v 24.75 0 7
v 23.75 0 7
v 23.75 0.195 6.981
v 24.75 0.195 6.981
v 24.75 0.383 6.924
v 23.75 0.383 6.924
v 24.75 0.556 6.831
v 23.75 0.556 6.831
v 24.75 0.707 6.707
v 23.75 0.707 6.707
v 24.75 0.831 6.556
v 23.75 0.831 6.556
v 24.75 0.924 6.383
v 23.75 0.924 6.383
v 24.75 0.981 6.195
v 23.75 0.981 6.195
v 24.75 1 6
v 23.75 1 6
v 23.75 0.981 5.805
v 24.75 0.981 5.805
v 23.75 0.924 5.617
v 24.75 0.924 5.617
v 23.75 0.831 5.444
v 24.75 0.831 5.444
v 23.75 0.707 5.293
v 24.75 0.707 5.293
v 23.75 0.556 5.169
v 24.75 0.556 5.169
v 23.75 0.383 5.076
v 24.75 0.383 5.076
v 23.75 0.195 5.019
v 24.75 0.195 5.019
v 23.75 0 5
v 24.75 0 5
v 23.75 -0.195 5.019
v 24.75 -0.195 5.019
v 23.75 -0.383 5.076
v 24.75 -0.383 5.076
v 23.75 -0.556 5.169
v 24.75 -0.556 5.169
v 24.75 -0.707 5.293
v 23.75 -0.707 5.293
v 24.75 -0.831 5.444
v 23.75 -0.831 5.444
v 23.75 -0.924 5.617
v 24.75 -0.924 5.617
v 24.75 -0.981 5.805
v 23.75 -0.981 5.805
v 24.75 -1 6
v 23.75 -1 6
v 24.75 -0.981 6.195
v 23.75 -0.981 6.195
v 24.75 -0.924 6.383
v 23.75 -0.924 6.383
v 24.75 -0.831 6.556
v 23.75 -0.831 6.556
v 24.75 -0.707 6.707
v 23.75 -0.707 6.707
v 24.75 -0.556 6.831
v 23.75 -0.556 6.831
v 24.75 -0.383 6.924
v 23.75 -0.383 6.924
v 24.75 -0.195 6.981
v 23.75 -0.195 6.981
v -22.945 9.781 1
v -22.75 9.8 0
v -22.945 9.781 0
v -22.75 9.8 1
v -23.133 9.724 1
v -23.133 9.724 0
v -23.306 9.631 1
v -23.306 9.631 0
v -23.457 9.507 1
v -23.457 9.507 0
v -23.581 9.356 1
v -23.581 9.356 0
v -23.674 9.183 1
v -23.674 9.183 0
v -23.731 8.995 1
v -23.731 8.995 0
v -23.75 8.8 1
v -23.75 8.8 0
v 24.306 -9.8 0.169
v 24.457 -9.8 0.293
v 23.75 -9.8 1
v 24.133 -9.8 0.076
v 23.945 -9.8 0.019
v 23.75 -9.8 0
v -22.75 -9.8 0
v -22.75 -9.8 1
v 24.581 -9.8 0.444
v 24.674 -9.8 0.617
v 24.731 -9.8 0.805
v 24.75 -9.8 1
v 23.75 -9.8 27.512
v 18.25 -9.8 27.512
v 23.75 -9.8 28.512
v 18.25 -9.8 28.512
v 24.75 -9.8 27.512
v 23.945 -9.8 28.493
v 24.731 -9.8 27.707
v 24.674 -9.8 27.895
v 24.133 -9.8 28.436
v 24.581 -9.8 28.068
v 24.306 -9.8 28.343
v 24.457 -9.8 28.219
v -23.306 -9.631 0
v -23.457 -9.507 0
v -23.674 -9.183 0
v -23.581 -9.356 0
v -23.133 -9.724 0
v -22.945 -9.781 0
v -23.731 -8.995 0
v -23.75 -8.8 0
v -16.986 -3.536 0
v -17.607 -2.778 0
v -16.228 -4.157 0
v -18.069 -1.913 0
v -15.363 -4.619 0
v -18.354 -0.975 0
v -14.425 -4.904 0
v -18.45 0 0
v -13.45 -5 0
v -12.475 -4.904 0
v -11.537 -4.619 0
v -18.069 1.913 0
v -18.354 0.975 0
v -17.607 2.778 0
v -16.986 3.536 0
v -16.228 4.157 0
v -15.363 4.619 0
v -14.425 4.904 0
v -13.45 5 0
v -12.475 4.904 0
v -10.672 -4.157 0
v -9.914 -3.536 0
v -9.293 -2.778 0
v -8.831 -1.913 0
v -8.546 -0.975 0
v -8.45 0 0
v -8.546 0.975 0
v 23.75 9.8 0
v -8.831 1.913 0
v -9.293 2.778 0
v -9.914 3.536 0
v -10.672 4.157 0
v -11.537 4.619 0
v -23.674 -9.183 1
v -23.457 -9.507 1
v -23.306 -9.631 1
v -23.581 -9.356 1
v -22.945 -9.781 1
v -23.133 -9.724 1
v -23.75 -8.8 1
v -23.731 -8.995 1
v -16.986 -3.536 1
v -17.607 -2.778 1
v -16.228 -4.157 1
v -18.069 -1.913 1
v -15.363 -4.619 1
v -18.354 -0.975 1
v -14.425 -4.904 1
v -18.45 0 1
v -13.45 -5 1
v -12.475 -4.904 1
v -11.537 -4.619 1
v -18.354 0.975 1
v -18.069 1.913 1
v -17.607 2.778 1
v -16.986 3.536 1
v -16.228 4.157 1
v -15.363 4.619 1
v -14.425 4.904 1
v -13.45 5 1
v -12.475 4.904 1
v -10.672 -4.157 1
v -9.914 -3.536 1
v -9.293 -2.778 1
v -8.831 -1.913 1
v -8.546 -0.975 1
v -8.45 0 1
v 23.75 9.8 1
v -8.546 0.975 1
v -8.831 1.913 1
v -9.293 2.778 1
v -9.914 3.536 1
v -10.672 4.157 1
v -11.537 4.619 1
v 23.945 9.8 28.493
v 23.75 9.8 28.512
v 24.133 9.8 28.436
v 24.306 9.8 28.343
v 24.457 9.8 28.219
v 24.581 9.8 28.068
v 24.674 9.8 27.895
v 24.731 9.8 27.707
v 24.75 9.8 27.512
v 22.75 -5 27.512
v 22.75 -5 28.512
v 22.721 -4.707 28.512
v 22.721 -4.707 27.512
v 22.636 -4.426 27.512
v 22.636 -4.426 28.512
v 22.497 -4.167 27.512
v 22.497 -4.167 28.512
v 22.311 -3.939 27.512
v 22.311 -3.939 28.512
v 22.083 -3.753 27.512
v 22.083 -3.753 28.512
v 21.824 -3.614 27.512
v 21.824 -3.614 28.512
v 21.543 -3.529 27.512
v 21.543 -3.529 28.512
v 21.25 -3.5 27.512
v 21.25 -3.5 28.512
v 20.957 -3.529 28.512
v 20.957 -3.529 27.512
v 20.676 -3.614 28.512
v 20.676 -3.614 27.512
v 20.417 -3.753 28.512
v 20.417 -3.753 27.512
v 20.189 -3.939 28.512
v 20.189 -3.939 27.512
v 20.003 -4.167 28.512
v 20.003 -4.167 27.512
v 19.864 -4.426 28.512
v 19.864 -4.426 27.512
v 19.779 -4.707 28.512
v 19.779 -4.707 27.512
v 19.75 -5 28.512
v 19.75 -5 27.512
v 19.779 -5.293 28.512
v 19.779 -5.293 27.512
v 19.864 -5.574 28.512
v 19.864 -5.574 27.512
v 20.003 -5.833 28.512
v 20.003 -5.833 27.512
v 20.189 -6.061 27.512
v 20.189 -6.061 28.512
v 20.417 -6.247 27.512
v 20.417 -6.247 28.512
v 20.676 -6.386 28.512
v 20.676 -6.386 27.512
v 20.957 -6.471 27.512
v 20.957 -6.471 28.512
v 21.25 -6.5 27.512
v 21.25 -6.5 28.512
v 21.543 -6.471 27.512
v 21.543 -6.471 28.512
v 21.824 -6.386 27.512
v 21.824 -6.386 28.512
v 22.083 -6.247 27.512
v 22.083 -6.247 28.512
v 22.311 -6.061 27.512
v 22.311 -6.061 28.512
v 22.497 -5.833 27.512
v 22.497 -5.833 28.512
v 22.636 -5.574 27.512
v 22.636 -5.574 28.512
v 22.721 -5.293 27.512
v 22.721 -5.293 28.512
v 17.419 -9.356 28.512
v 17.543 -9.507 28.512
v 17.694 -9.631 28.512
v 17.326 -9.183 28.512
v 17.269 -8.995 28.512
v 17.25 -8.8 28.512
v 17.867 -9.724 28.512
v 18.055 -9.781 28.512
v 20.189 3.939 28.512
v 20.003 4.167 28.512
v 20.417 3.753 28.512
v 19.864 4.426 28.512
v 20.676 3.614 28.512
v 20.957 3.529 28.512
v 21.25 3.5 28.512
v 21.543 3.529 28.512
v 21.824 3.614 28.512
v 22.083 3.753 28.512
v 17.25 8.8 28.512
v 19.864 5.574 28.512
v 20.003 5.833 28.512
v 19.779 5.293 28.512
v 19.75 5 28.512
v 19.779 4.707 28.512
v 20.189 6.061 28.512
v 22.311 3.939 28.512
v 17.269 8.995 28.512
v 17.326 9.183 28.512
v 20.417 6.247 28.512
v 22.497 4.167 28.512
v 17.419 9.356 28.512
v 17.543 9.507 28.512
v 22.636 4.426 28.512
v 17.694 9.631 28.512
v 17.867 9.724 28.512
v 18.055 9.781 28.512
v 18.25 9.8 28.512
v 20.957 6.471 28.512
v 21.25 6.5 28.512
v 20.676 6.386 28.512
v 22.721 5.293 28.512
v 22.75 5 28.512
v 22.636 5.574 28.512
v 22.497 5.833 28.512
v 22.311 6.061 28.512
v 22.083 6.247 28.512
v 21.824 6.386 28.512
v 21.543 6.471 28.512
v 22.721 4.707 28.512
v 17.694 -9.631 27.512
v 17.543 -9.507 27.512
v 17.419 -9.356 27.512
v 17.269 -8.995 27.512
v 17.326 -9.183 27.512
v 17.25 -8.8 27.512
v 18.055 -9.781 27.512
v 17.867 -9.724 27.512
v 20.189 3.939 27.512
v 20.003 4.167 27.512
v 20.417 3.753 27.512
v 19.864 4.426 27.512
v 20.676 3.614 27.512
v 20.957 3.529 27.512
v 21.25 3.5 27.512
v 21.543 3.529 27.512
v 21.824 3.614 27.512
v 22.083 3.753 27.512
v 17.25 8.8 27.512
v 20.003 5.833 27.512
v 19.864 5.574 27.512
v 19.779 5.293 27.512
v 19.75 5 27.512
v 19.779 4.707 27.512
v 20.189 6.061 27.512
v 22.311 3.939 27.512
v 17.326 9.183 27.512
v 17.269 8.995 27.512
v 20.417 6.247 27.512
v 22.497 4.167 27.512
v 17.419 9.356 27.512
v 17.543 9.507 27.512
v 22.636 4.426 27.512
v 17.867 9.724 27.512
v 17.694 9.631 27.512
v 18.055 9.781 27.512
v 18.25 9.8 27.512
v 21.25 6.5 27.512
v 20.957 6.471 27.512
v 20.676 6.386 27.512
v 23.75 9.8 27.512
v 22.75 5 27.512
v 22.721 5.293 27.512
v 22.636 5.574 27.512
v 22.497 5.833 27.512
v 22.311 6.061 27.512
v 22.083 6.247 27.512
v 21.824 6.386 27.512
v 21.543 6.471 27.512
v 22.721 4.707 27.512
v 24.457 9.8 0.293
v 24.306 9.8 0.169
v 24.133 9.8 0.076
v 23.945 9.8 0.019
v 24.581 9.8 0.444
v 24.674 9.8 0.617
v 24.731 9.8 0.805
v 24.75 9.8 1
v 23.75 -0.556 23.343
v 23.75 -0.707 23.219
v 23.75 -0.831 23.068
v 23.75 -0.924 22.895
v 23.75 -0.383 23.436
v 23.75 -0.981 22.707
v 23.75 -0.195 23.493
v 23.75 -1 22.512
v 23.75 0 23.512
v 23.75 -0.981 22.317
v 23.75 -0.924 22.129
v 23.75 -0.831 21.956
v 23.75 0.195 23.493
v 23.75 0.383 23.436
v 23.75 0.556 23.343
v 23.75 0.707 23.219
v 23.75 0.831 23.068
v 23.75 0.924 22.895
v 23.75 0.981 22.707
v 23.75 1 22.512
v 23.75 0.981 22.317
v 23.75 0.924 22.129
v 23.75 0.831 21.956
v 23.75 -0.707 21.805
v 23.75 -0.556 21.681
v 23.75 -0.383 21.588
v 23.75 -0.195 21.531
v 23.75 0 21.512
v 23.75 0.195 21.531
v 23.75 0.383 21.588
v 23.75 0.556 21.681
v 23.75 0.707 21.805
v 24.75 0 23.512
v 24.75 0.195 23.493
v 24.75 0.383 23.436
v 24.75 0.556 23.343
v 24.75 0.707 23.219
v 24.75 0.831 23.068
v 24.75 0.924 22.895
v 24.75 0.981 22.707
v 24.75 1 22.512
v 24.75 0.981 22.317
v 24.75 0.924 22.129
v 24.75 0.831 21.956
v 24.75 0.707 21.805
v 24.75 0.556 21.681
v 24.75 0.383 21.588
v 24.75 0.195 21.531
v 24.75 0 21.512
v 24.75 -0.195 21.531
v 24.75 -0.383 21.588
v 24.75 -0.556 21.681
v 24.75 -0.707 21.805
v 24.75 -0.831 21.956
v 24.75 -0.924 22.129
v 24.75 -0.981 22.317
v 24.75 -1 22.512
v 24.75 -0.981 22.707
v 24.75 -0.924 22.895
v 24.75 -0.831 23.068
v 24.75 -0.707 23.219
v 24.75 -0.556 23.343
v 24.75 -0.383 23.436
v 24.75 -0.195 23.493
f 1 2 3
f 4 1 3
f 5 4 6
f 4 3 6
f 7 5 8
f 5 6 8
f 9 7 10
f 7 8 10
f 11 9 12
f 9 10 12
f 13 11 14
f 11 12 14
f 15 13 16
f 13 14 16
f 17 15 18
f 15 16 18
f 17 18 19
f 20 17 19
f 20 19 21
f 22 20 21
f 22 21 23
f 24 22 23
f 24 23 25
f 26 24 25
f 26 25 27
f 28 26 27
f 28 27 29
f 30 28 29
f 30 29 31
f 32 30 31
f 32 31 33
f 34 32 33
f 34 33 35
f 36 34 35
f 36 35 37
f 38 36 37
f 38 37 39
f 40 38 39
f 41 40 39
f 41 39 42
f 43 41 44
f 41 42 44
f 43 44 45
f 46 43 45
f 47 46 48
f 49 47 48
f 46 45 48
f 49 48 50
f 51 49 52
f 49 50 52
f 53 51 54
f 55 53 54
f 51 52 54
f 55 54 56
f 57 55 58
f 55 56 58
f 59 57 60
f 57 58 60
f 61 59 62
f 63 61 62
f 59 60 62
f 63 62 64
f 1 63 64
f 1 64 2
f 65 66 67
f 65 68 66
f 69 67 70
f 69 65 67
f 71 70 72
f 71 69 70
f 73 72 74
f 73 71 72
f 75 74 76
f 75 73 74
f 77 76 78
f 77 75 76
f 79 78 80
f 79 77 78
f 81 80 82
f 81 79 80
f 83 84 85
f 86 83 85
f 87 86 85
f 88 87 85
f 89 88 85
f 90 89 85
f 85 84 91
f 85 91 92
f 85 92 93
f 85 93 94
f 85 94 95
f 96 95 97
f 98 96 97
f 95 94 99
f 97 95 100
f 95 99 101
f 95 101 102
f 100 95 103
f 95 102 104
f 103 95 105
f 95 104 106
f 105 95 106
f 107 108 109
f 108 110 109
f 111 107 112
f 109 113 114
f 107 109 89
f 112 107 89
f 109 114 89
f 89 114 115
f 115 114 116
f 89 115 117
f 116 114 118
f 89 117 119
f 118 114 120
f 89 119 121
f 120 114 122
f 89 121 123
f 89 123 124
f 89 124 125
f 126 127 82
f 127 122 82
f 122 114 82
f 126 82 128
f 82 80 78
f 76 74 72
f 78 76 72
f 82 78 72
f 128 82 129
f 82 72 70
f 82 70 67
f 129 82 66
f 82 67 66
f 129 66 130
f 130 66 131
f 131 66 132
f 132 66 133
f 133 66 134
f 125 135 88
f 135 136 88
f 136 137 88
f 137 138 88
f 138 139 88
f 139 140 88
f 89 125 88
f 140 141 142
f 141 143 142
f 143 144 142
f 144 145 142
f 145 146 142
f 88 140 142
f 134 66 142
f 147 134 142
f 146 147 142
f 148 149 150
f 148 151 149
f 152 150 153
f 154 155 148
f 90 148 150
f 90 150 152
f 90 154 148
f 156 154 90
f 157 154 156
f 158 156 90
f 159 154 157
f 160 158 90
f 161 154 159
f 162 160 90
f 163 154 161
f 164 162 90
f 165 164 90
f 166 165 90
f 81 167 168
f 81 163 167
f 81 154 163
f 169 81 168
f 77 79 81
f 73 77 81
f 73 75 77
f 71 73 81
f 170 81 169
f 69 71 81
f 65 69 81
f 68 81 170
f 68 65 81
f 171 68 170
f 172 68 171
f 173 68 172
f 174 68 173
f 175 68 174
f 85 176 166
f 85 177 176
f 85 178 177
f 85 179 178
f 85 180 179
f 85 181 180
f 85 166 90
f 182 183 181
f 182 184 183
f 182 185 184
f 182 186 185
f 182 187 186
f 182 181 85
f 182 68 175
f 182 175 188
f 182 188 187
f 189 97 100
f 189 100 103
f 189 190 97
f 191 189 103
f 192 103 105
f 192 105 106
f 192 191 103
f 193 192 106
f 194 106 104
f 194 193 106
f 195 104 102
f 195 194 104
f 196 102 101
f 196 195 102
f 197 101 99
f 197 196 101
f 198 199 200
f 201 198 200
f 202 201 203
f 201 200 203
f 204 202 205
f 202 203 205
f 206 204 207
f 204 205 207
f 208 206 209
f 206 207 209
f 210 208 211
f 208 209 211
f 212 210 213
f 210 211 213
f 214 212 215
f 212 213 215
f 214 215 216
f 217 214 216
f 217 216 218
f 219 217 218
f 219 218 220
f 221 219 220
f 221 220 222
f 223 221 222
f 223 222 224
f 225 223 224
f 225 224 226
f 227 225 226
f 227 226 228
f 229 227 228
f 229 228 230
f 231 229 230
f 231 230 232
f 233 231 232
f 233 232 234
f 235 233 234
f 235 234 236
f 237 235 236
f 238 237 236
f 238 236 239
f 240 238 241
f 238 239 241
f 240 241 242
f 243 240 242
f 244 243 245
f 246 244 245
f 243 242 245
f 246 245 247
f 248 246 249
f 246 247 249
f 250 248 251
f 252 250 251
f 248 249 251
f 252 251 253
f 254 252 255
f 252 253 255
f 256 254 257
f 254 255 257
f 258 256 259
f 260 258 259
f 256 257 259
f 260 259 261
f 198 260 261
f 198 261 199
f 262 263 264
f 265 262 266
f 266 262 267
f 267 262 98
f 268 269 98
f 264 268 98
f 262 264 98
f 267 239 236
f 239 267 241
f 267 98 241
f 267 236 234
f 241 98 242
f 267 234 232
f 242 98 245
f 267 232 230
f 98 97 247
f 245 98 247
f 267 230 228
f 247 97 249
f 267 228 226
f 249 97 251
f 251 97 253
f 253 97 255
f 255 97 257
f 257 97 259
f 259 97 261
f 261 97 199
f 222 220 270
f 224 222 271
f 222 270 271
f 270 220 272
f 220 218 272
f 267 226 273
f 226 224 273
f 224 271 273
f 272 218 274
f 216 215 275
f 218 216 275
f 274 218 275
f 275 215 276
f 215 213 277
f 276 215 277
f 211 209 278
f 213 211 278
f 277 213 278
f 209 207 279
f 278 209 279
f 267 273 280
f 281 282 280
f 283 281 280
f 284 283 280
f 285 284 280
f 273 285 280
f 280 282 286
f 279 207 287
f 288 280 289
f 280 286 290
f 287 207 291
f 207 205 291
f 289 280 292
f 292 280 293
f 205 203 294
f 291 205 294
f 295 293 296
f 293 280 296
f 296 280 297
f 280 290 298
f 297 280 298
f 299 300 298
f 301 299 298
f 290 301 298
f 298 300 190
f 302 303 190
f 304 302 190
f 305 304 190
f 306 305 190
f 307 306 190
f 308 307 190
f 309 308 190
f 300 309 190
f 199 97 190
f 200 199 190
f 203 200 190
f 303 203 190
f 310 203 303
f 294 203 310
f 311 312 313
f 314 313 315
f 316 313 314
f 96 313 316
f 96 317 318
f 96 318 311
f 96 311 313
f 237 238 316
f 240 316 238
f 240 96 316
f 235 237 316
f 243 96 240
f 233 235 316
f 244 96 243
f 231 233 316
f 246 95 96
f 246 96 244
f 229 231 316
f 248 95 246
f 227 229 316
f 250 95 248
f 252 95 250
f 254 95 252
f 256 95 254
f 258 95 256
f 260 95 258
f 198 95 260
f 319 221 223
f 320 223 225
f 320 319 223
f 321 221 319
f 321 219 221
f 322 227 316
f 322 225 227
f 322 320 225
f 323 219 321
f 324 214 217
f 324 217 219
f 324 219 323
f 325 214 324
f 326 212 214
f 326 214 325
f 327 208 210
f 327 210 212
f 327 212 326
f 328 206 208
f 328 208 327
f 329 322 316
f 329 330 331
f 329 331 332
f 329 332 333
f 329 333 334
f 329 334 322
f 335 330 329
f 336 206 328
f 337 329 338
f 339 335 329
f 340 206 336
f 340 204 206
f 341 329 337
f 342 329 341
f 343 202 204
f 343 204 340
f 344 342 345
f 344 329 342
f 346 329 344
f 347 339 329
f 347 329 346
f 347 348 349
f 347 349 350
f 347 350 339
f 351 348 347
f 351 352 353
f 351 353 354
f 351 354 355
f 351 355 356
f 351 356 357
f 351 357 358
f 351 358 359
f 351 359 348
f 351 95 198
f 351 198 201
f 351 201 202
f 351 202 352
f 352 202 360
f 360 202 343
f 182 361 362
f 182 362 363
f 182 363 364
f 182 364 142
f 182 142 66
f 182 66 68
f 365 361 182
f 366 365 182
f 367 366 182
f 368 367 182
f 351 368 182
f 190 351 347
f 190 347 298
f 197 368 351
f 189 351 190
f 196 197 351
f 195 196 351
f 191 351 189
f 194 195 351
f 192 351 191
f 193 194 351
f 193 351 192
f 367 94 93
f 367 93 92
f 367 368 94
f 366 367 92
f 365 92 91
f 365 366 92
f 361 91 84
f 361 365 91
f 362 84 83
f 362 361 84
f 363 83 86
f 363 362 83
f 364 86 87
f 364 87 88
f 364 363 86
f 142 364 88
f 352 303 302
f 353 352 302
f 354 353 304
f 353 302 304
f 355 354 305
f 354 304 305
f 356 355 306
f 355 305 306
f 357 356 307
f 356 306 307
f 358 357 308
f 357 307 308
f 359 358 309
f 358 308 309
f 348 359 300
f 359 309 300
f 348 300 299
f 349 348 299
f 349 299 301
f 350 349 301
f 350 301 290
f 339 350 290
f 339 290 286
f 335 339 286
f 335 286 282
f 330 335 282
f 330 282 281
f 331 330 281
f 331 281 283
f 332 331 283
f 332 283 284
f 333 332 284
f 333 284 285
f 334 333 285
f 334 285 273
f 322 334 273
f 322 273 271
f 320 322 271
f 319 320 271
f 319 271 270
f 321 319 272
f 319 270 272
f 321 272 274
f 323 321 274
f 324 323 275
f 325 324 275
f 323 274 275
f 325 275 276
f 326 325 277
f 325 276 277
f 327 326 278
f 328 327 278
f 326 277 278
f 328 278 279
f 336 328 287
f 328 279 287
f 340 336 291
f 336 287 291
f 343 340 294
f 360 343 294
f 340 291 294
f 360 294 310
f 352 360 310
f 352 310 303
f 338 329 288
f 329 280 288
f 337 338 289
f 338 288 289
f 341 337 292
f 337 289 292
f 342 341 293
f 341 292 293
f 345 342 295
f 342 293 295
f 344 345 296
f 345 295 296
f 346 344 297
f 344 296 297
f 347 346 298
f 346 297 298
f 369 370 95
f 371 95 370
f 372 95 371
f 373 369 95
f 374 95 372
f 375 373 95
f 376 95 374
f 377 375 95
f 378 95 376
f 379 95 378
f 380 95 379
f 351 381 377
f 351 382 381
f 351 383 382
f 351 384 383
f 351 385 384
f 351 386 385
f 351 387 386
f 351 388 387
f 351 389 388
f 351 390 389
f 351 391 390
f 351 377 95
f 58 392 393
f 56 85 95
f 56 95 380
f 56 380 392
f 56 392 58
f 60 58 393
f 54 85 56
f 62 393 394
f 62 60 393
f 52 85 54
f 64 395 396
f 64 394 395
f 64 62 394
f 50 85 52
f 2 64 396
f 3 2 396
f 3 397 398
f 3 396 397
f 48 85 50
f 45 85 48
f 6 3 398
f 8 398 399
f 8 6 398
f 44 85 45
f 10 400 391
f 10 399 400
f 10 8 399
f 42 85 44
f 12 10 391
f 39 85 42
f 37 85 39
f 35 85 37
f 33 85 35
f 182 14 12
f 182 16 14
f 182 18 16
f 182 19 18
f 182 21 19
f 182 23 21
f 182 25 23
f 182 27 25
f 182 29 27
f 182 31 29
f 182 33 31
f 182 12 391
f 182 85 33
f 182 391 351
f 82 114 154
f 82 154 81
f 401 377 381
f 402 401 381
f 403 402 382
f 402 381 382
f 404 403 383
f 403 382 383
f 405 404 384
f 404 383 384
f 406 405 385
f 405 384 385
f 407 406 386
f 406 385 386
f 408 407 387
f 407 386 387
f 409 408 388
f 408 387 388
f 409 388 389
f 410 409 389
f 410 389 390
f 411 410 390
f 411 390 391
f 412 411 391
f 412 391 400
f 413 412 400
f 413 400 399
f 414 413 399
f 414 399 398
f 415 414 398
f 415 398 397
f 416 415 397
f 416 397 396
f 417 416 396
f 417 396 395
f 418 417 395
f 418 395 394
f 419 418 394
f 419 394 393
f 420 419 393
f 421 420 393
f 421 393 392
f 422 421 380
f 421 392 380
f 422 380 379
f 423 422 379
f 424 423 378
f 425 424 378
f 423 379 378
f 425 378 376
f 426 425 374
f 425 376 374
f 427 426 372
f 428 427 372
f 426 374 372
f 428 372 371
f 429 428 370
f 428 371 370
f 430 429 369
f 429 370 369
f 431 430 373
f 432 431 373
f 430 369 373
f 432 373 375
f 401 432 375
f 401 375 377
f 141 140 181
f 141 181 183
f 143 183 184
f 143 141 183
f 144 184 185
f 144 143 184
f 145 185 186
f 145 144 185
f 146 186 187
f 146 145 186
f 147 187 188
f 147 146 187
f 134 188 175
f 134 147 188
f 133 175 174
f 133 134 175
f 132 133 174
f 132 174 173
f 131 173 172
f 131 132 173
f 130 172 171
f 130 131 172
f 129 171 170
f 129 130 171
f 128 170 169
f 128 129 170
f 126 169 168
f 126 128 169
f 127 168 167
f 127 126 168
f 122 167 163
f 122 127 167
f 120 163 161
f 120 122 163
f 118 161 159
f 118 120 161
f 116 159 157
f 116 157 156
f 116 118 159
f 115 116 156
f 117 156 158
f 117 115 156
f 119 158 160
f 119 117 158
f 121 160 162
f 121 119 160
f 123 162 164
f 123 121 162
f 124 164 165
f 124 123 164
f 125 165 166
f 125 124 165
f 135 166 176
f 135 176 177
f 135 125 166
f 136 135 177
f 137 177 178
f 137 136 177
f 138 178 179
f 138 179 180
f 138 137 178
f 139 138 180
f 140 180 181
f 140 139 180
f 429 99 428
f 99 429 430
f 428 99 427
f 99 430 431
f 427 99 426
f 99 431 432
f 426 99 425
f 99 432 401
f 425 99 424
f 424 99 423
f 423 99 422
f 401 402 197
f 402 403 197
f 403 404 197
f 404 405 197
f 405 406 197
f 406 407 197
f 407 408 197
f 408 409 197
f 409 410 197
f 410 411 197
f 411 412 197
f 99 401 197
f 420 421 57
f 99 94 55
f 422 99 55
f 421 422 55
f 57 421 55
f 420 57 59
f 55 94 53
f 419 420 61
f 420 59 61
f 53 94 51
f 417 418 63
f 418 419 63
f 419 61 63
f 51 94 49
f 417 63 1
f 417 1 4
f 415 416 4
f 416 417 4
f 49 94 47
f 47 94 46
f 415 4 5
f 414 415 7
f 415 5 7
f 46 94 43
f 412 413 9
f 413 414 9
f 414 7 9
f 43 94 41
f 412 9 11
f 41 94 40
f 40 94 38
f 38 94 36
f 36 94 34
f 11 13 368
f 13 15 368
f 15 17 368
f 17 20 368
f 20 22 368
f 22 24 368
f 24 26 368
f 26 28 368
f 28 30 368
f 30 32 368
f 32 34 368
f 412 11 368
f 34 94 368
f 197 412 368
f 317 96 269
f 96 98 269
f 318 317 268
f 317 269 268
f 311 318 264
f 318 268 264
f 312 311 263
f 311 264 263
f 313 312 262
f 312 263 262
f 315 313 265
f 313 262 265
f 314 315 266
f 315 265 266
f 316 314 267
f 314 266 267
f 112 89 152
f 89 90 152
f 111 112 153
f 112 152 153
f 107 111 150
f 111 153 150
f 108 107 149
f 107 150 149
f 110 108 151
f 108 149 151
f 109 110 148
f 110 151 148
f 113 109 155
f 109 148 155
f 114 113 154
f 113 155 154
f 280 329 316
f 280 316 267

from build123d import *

# Parameters (mm, degrees)
SKETCH1_W           = 47.5
SKETCH1_H           = 19.6
SKETCH1_R           = 5
BOSS_EXTRUDE1_DEPTH = 1
BOSS_EXTRUDE2_START = -1
SKETCH2_W           = 1
SKETCH2_H           = 19.6
BOSS_EXTRUDE2_DEPTH = 28.512
SKETCH3_W           = 1
SKETCH3_H           = 19.6
BOSS_EXTRUDE3_DEPTH = 6.5
CUT_EXTRUDE1_REACH  = 30.512
SKETCH4_R           = 1.5
SKETCH6_R           = 1
CUT_EXTRUDE2_DEPTH  = 6.5
FILLET1_R           = 1


with BuildPart() as part:
    # Sketch1 → Boss-Extrude1 (new body)
    with BuildSketch(Plane.XY):
        Rectangle(SKETCH1_W, SKETCH1_H)
        with Locations((-13.45, 0)):
            Circle(SKETCH1_R, mode=Mode.SUBTRACT)
    extrude(amount=BOSS_EXTRUDE1_DEPTH)

    # Sketch2 → Boss-Extrude2 (add)
    with BuildSketch(Plane.XY.offset(1).offset(BOSS_EXTRUDE2_START)):
        with Locations((24.25, 0)):
            Rectangle(SKETCH2_W, SKETCH2_H)
    extrude(amount=BOSS_EXTRUDE2_DEPTH)

    # Sketch3 → Boss-Extrude3 (add)
    with BuildSketch(Plane.ZY.offset(-23.75)):
        with Locations((28.012, 0)):
            Rectangle(SKETCH3_W, SKETCH3_H)
    extrude(amount=BOSS_EXTRUDE3_DEPTH)

    # Sketch4 → Cut-Extrude1 (cut, up to next)
    with BuildSketch(Plane.XY.offset(28.512), mode=Mode.PRIVATE) as cut_extrude1_sk1:
        with Locations((21.25, 5)):
            Circle(SKETCH4_R)
    cut_extrude1_tool1 = extrude(cut_extrude1_sk1.sketch, amount=-CUT_EXTRUDE1_REACH, mode=Mode.PRIVATE) & part.part
    add(cut_extrude1_tool1.solids().sort_by_distance((21.25, 5, 28.512))[0], mode=Mode.SUBTRACT)
    # Sketch4 → Cut-Extrude1 (cut, up to next)
    with BuildSketch(Plane.XY.offset(28.512), mode=Mode.PRIVATE) as cut_extrude1_sk2:
        with Locations((21.25, -5)):
            Circle(SKETCH4_R)
    cut_extrude1_tool2 = extrude(cut_extrude1_sk2.sketch, amount=-CUT_EXTRUDE1_REACH, mode=Mode.PRIVATE) & part.part
    add(cut_extrude1_tool2.solids().sort_by_distance((21.25, -5, 28.512))[0], mode=Mode.SUBTRACT)

    # Sketch6 → Cut-Extrude2 (cut)
    with BuildSketch(Plane.ZY.offset(-23.75)):
        with Locations((6, 0)):
            Circle(SKETCH6_R)
        with Locations((22.512, 0)):
            Circle(SKETCH6_R)
    extrude(amount=-CUT_EXTRUDE2_DEPTH, mode=Mode.SUBTRACT)

    # Fillet1
    fillet1_edges = [part.edges().sort_by_distance(p)[0] for p in [
        (-23.75, 9.8, 0.5),
        (-23.75, -9.8, 0.5),
        (17.25, -9.8, 28.012),
        (17.25, 9.8, 28.012),
        (24.75, 0, 0),
        (24.75, 0, 28.512),
    ]]
    fillet(fillet1_edges, radius=FILLET1_R)


solid = part.part
